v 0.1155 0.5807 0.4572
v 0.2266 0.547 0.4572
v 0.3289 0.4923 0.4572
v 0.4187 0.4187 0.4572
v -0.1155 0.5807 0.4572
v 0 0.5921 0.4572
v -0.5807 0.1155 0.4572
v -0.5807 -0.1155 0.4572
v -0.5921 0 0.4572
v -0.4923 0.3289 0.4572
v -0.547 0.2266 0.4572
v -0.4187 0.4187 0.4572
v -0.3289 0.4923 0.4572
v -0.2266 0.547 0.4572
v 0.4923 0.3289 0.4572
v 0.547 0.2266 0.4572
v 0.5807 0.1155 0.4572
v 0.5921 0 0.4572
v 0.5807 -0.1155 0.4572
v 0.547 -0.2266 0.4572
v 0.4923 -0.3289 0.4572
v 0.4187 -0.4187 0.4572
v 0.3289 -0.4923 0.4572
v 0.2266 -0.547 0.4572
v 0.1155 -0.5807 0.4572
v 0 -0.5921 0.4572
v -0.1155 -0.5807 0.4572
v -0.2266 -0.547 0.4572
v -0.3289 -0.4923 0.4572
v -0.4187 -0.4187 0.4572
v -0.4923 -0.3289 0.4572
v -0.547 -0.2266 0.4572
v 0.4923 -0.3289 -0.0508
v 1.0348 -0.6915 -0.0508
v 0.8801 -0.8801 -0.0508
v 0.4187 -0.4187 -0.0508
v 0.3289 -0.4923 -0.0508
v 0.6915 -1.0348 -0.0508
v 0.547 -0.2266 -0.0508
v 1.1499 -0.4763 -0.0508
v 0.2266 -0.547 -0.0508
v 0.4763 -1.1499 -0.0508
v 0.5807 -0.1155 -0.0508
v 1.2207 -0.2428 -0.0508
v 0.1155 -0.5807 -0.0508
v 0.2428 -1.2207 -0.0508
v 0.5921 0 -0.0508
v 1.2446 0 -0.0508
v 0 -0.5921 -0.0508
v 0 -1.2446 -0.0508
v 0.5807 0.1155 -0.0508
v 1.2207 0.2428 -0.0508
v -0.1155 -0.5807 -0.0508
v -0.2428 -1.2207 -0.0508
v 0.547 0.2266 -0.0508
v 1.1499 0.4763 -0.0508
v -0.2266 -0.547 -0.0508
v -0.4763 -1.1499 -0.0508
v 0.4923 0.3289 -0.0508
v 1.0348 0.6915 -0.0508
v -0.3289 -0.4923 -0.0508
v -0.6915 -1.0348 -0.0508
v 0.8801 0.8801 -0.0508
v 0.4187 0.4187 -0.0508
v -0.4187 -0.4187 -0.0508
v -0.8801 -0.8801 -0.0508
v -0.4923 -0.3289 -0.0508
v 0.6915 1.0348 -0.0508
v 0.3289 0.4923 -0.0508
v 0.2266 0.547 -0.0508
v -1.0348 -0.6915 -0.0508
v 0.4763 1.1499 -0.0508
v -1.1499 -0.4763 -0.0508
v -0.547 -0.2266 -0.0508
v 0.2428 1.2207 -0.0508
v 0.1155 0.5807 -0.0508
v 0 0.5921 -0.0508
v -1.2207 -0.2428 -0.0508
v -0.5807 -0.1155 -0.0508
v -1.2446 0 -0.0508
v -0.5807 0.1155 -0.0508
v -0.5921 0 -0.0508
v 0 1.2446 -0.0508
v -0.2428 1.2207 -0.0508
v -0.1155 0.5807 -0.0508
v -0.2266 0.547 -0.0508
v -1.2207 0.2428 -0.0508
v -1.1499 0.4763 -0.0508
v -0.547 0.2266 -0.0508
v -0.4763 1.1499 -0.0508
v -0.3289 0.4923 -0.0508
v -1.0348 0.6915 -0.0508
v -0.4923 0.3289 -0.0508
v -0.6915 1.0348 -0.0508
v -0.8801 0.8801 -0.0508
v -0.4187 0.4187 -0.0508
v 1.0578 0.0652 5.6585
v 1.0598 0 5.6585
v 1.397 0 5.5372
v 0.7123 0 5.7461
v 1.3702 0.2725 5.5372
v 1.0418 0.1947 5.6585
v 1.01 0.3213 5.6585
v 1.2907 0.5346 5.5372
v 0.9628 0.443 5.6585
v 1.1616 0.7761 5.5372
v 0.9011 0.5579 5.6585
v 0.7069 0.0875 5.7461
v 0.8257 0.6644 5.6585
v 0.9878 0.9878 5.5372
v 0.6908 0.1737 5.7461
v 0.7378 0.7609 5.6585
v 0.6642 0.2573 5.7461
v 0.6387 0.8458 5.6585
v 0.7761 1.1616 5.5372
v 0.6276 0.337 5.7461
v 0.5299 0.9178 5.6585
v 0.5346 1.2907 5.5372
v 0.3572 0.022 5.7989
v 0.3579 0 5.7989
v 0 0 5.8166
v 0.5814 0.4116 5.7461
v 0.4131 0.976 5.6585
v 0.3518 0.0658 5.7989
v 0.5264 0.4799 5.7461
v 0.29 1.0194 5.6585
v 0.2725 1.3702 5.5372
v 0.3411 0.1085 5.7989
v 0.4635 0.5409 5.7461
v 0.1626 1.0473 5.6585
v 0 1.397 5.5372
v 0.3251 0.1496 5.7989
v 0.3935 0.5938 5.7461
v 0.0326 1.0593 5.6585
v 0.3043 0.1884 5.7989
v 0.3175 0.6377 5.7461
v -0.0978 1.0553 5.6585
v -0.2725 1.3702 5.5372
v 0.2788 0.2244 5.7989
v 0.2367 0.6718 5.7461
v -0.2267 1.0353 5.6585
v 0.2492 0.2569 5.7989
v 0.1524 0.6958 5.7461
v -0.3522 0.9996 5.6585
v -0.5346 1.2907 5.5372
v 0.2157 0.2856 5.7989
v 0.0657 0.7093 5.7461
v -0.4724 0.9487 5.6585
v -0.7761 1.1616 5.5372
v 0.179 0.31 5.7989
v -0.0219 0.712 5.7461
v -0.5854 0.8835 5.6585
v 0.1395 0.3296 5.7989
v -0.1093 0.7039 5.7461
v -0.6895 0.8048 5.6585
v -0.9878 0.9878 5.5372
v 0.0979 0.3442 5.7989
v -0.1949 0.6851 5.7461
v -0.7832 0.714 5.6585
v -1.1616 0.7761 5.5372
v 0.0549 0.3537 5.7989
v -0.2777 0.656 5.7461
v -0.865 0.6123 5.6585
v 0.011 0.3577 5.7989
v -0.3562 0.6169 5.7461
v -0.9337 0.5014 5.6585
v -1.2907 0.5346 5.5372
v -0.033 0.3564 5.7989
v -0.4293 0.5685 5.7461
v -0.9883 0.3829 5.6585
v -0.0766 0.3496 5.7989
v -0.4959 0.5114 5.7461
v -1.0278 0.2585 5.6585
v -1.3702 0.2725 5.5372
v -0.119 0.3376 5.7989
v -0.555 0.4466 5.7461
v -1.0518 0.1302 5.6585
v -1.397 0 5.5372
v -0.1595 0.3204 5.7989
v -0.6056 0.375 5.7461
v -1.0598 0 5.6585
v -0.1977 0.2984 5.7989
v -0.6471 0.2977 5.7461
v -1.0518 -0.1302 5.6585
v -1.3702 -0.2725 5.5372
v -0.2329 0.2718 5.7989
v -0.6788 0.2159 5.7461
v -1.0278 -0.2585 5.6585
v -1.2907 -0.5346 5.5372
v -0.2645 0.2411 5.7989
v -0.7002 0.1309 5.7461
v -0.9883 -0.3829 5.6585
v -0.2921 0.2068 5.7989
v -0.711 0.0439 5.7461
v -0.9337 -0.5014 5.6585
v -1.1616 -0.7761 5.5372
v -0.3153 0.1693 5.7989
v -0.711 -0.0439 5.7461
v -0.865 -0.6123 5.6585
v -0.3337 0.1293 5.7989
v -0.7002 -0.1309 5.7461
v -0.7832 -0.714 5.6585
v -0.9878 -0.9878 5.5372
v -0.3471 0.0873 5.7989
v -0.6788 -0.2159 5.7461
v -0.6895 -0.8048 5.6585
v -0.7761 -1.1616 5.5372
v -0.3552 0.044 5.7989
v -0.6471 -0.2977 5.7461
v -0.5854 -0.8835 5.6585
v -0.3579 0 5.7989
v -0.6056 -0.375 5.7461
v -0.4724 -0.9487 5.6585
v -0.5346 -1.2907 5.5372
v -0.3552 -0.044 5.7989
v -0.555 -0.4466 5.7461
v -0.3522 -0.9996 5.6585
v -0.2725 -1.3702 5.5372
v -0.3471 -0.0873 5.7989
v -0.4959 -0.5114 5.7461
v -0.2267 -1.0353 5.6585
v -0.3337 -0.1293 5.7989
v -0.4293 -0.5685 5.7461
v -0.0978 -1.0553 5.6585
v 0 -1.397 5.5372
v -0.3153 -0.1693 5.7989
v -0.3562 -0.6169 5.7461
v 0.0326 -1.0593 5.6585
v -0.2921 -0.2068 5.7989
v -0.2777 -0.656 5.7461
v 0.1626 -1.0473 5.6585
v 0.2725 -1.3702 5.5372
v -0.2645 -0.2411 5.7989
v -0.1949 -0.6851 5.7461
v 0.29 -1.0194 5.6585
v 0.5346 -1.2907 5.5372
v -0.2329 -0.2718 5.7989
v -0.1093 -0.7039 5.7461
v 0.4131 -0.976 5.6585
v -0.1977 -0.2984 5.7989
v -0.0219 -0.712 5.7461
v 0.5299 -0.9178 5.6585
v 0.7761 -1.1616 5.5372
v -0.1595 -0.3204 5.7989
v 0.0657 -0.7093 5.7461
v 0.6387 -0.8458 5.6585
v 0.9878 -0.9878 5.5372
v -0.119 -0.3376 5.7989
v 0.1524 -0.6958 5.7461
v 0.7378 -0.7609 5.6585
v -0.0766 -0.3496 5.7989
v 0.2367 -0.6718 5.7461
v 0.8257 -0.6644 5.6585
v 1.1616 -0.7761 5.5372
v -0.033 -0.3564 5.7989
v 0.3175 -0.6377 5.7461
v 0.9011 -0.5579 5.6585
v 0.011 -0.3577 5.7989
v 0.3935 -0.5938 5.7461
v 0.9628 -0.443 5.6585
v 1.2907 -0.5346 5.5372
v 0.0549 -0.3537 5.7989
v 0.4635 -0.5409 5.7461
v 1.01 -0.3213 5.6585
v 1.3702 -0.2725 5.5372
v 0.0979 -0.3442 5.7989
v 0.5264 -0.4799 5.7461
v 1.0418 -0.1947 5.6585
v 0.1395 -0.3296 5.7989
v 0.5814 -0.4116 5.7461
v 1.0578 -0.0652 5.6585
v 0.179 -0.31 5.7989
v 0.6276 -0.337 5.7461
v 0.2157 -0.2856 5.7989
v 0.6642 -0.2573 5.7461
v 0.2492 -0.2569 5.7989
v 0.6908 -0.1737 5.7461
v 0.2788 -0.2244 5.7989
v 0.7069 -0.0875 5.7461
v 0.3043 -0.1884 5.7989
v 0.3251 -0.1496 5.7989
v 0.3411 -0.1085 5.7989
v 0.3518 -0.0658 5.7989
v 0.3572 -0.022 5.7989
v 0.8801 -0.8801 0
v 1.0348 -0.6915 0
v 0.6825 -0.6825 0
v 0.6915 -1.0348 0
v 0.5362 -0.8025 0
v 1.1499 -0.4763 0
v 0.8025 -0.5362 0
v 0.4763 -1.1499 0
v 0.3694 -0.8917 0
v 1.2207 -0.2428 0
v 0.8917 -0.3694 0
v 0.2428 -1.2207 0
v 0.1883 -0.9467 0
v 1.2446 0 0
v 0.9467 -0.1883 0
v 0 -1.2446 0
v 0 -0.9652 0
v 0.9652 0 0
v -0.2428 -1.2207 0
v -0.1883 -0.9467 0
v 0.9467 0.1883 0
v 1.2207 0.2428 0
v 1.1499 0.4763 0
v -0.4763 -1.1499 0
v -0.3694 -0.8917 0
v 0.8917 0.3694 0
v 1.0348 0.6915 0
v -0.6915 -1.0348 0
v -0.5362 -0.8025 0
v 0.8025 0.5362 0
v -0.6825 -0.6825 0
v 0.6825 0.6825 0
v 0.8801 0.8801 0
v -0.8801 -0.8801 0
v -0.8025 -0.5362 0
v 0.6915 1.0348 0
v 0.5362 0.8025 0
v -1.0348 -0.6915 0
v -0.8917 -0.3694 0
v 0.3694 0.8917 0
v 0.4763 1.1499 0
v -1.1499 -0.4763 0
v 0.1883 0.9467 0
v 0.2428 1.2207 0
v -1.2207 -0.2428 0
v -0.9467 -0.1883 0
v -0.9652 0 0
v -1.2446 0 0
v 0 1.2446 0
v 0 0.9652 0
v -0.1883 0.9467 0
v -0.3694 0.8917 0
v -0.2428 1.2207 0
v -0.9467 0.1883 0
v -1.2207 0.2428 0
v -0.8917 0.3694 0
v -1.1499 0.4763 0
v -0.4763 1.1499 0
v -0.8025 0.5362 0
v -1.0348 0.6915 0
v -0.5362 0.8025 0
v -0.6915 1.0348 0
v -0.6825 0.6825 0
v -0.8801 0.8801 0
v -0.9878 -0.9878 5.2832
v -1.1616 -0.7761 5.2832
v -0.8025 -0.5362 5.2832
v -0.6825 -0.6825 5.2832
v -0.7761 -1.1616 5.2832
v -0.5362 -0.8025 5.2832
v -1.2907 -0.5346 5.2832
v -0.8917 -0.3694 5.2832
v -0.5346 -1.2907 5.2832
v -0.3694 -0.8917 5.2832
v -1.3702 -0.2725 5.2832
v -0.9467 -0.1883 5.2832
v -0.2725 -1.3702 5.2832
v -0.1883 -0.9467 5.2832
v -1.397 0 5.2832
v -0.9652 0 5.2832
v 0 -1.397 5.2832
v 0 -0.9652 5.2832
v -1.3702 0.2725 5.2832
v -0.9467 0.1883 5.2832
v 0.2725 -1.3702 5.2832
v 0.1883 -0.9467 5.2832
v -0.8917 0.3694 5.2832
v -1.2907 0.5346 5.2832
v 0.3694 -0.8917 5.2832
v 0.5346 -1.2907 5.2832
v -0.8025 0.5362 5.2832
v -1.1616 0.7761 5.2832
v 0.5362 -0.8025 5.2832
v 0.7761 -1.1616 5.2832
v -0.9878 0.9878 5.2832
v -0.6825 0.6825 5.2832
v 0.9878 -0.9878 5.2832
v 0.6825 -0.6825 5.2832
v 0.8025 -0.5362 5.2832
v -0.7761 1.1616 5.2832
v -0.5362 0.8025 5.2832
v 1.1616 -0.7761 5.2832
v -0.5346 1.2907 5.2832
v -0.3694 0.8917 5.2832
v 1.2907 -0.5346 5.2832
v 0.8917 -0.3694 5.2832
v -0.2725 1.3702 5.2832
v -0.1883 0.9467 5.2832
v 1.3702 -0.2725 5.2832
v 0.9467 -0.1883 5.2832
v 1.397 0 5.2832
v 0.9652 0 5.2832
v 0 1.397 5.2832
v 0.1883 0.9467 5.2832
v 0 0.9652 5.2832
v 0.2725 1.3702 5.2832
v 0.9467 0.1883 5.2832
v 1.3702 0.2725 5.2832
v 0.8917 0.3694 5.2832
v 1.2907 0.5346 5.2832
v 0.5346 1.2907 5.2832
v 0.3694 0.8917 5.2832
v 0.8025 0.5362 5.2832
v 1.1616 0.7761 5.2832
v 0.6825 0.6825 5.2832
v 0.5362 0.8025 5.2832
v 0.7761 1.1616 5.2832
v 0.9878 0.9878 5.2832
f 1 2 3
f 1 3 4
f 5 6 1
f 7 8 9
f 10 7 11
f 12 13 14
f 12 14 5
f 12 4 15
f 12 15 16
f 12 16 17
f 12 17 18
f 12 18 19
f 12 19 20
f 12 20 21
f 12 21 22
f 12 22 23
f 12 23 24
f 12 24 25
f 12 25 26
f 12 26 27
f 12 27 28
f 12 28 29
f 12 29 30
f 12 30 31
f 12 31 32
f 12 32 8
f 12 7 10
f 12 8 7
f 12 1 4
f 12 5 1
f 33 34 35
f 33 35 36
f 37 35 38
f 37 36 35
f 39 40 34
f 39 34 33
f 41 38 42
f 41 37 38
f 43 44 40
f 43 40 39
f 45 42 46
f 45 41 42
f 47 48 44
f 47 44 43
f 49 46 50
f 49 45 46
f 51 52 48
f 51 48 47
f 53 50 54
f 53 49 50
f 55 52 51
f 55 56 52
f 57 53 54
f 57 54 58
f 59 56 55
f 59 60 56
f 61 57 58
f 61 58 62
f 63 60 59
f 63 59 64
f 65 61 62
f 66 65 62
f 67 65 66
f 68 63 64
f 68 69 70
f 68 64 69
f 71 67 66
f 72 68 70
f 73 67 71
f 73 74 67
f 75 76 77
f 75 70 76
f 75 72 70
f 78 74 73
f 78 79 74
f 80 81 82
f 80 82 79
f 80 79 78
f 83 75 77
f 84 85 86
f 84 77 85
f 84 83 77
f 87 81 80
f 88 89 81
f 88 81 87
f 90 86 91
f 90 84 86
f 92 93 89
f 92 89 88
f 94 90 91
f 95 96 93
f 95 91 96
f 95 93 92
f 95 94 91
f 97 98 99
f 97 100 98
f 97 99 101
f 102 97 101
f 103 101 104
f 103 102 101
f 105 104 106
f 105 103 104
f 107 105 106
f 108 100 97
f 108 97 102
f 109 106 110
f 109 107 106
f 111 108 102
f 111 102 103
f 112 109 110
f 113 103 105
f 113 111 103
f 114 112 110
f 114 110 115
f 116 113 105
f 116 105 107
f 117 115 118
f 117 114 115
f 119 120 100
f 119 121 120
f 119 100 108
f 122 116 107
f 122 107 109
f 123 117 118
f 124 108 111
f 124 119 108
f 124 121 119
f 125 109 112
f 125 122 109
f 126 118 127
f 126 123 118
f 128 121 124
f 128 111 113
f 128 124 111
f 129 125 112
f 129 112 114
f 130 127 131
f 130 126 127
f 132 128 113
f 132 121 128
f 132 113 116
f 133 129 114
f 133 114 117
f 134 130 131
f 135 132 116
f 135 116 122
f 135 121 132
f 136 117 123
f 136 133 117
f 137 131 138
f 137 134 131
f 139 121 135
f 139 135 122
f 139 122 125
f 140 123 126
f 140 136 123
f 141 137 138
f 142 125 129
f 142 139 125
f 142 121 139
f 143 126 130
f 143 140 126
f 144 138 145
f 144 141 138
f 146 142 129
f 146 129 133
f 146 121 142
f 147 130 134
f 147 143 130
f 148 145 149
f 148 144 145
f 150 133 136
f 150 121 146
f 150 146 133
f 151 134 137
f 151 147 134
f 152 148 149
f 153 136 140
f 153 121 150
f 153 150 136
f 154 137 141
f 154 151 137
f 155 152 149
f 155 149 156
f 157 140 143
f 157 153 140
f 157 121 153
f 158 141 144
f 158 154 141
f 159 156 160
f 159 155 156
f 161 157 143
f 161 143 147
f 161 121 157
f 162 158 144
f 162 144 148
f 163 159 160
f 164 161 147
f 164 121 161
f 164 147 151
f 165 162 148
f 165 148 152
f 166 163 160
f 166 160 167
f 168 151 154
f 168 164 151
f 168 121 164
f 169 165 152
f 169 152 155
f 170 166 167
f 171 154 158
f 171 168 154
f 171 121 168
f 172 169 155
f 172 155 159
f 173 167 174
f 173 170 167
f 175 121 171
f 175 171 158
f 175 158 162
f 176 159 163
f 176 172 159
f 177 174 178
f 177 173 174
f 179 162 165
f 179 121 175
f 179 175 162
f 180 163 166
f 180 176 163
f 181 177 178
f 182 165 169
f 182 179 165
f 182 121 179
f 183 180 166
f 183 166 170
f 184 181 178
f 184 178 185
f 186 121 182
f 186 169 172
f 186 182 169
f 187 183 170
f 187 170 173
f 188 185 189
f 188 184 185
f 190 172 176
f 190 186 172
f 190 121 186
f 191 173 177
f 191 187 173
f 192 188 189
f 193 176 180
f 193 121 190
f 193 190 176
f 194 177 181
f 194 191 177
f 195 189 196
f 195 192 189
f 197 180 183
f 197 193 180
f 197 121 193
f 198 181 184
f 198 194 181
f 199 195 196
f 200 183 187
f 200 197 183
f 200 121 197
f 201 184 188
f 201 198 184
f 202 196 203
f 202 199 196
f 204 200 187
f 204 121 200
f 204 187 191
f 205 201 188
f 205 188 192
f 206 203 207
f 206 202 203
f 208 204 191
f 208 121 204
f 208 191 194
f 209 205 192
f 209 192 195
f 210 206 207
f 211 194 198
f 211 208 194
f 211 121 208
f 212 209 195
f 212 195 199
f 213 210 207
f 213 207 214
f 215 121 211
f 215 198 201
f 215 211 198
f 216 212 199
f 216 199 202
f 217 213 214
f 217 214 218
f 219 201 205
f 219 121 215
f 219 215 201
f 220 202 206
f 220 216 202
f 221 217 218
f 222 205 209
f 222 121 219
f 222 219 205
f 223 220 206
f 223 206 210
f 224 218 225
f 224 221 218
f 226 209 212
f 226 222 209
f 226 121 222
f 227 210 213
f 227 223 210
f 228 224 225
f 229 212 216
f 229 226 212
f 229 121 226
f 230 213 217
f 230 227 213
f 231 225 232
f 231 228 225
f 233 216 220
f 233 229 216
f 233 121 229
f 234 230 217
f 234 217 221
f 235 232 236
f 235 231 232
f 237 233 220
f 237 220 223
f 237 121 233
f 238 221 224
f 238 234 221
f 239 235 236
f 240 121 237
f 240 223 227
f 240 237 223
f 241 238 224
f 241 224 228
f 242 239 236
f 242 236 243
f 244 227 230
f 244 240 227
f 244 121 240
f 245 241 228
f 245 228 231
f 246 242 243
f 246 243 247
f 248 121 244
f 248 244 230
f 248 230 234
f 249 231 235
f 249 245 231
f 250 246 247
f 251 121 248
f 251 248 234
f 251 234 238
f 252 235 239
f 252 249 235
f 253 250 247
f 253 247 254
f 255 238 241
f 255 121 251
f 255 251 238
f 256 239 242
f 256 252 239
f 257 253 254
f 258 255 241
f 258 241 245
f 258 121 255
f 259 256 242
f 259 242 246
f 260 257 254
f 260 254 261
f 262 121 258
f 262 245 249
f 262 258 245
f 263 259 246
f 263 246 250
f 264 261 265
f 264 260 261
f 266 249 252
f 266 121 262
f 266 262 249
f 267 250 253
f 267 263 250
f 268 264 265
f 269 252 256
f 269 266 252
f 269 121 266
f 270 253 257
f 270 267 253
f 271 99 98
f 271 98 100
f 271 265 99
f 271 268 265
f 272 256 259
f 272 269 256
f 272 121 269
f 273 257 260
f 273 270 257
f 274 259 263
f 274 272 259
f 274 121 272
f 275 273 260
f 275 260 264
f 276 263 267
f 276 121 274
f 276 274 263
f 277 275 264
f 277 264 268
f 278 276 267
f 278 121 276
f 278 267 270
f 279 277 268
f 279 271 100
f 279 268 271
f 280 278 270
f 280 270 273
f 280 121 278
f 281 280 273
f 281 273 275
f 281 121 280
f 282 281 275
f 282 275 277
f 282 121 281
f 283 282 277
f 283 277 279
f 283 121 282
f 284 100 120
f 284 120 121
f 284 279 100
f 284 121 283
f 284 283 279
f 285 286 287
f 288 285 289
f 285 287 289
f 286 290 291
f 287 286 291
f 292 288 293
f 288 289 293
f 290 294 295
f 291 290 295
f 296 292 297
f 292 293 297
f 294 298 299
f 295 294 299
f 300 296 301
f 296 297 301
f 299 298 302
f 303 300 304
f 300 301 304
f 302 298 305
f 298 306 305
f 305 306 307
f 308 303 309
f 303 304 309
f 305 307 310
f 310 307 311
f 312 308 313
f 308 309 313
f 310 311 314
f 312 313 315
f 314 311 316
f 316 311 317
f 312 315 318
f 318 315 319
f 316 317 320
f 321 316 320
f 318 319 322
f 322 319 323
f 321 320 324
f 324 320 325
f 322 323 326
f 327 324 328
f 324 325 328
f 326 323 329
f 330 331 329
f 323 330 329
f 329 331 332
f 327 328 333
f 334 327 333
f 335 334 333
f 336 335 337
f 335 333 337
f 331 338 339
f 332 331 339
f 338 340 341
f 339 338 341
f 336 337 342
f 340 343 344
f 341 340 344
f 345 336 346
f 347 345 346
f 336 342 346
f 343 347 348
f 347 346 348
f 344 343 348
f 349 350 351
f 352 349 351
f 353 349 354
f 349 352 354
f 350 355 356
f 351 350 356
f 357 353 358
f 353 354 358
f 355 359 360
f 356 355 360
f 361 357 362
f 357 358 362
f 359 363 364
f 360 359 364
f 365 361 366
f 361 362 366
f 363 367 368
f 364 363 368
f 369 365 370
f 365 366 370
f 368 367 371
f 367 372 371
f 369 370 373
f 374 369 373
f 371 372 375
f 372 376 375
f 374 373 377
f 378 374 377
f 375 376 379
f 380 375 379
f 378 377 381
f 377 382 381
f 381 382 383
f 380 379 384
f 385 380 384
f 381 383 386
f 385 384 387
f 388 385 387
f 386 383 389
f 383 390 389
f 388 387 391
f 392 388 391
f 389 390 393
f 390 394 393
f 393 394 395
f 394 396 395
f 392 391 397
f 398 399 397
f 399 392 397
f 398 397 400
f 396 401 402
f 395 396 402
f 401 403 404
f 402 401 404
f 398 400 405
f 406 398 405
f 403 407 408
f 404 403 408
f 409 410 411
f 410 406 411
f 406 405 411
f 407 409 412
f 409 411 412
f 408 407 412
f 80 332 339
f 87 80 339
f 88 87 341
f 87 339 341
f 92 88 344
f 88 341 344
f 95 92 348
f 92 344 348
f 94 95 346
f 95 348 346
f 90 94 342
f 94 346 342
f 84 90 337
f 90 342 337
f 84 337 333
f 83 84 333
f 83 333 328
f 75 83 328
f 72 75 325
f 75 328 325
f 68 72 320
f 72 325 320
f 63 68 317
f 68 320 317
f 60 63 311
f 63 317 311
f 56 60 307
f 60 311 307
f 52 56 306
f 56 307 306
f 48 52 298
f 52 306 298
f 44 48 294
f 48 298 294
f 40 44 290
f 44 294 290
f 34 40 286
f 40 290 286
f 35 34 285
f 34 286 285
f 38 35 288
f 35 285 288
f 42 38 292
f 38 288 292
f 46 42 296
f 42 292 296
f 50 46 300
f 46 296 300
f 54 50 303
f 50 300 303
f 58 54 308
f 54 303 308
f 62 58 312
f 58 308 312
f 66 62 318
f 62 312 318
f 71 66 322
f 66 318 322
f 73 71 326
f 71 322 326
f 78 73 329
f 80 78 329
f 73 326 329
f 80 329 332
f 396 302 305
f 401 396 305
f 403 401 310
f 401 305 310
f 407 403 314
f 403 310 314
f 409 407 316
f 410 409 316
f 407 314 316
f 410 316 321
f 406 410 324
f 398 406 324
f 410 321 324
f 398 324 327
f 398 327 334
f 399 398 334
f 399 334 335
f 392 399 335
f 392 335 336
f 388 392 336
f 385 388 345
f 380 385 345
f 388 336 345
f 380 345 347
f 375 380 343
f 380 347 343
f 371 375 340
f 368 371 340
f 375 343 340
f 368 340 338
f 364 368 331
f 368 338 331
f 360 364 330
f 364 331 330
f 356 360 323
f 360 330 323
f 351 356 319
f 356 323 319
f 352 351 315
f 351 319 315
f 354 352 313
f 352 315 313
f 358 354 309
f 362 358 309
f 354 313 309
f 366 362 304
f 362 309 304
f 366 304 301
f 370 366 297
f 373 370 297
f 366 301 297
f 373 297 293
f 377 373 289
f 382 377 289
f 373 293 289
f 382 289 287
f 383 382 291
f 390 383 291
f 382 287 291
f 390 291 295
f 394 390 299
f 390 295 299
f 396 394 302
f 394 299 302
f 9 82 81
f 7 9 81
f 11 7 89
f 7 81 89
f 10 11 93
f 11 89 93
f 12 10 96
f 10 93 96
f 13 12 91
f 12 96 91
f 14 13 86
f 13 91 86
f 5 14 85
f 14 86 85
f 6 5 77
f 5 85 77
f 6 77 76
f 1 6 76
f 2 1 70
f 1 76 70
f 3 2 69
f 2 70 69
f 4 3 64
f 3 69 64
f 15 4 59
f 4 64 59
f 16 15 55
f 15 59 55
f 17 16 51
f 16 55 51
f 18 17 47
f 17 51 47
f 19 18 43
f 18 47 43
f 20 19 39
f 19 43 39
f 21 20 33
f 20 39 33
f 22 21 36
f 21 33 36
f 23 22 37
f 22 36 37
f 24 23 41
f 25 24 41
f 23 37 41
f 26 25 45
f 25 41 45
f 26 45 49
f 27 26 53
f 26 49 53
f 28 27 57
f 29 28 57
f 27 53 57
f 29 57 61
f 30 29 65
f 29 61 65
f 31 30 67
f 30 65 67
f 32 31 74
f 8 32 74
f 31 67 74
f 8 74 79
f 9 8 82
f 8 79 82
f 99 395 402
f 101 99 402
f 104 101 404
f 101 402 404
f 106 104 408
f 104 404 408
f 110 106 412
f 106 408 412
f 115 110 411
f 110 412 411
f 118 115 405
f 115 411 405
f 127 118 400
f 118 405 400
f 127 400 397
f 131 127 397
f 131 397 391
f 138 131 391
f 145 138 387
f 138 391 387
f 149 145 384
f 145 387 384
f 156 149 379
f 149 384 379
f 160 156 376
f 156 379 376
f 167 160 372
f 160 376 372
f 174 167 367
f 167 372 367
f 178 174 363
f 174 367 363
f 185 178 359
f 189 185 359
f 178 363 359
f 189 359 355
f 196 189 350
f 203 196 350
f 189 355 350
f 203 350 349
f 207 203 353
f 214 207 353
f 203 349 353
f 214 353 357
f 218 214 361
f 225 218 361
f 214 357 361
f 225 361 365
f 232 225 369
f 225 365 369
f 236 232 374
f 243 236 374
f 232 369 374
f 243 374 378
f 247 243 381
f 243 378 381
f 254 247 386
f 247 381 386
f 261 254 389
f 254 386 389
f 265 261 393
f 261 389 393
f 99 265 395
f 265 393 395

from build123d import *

# Parameters (mm, degrees)
SKETCH1_R           = 0.9652
BOSS_EXTRUDE1_DEPTH = 5.2832
SKETCH2_R           = 1.397
BOSS_EXTRUDE2_DEPTH = 0.254
DOME1_FACE_RADIUS   = 1.397
DOME1_HEIGHT        = 0.2794
SKETCH3_R           = 1.2446
BOSS_EXTRUDE3_DEPTH = 0.0508
SKETCH4_R           = 0.592078561
CUT_EXTRUDE1_DEPTH  = 0.508


with BuildPart() as part:
    # Sketch1 → Boss-Extrude1 (new body)
    with BuildSketch(Plane.XY):
        Circle(SKETCH1_R)
    extrude(amount=BOSS_EXTRUDE1_DEPTH)

    # Sketch2 → Boss-Extrude2 (add)
    with BuildSketch(Plane.XY.offset(5.2832)):
        Circle(SKETCH2_R)
    extrude(amount=BOSS_EXTRUDE2_DEPTH)

    # Dome1: a dome of height H over a round flat face of radius A is a cap of a sphere of radius (A * A + H * H) / (2 * H)
    dome1_r = (DOME1_FACE_RADIUS * DOME1_FACE_RADIUS + DOME1_HEIGHT * DOME1_HEIGHT) / (2 * DOME1_HEIGHT)
    dome1_base = Plane((0, 0, 5.5372), z_dir=(0, 0, 1))
    with Locations(dome1_base.offset(DOME1_HEIGHT - dome1_r)):
        dome1_ball = Sphere(dome1_r, mode=Mode.PRIVATE)
    add(split(dome1_ball, bisect_by=dome1_base, keep=Keep.TOP, mode=Mode.PRIVATE))

    # Sketch3 → Boss-Extrude3 (add)
    with BuildSketch(Plane(origin=(0, 0, 0), x_dir=(-1, 0, 0), z_dir=(0, 0, -1))):
        Circle(SKETCH3_R)
    extrude(amount=BOSS_EXTRUDE3_DEPTH)

    # Sketch4 → Cut-Extrude1 (cut)
    with BuildSketch(Plane(origin=(0, 0, -0.0508), x_dir=(-1, 0, 0), z_dir=(0, 0, -1))):
        Circle(SKETCH4_R)
    extrude(amount=-CUT_EXTRUDE1_DEPTH, mode=Mode.SUBTRACT)


solid = part.part
